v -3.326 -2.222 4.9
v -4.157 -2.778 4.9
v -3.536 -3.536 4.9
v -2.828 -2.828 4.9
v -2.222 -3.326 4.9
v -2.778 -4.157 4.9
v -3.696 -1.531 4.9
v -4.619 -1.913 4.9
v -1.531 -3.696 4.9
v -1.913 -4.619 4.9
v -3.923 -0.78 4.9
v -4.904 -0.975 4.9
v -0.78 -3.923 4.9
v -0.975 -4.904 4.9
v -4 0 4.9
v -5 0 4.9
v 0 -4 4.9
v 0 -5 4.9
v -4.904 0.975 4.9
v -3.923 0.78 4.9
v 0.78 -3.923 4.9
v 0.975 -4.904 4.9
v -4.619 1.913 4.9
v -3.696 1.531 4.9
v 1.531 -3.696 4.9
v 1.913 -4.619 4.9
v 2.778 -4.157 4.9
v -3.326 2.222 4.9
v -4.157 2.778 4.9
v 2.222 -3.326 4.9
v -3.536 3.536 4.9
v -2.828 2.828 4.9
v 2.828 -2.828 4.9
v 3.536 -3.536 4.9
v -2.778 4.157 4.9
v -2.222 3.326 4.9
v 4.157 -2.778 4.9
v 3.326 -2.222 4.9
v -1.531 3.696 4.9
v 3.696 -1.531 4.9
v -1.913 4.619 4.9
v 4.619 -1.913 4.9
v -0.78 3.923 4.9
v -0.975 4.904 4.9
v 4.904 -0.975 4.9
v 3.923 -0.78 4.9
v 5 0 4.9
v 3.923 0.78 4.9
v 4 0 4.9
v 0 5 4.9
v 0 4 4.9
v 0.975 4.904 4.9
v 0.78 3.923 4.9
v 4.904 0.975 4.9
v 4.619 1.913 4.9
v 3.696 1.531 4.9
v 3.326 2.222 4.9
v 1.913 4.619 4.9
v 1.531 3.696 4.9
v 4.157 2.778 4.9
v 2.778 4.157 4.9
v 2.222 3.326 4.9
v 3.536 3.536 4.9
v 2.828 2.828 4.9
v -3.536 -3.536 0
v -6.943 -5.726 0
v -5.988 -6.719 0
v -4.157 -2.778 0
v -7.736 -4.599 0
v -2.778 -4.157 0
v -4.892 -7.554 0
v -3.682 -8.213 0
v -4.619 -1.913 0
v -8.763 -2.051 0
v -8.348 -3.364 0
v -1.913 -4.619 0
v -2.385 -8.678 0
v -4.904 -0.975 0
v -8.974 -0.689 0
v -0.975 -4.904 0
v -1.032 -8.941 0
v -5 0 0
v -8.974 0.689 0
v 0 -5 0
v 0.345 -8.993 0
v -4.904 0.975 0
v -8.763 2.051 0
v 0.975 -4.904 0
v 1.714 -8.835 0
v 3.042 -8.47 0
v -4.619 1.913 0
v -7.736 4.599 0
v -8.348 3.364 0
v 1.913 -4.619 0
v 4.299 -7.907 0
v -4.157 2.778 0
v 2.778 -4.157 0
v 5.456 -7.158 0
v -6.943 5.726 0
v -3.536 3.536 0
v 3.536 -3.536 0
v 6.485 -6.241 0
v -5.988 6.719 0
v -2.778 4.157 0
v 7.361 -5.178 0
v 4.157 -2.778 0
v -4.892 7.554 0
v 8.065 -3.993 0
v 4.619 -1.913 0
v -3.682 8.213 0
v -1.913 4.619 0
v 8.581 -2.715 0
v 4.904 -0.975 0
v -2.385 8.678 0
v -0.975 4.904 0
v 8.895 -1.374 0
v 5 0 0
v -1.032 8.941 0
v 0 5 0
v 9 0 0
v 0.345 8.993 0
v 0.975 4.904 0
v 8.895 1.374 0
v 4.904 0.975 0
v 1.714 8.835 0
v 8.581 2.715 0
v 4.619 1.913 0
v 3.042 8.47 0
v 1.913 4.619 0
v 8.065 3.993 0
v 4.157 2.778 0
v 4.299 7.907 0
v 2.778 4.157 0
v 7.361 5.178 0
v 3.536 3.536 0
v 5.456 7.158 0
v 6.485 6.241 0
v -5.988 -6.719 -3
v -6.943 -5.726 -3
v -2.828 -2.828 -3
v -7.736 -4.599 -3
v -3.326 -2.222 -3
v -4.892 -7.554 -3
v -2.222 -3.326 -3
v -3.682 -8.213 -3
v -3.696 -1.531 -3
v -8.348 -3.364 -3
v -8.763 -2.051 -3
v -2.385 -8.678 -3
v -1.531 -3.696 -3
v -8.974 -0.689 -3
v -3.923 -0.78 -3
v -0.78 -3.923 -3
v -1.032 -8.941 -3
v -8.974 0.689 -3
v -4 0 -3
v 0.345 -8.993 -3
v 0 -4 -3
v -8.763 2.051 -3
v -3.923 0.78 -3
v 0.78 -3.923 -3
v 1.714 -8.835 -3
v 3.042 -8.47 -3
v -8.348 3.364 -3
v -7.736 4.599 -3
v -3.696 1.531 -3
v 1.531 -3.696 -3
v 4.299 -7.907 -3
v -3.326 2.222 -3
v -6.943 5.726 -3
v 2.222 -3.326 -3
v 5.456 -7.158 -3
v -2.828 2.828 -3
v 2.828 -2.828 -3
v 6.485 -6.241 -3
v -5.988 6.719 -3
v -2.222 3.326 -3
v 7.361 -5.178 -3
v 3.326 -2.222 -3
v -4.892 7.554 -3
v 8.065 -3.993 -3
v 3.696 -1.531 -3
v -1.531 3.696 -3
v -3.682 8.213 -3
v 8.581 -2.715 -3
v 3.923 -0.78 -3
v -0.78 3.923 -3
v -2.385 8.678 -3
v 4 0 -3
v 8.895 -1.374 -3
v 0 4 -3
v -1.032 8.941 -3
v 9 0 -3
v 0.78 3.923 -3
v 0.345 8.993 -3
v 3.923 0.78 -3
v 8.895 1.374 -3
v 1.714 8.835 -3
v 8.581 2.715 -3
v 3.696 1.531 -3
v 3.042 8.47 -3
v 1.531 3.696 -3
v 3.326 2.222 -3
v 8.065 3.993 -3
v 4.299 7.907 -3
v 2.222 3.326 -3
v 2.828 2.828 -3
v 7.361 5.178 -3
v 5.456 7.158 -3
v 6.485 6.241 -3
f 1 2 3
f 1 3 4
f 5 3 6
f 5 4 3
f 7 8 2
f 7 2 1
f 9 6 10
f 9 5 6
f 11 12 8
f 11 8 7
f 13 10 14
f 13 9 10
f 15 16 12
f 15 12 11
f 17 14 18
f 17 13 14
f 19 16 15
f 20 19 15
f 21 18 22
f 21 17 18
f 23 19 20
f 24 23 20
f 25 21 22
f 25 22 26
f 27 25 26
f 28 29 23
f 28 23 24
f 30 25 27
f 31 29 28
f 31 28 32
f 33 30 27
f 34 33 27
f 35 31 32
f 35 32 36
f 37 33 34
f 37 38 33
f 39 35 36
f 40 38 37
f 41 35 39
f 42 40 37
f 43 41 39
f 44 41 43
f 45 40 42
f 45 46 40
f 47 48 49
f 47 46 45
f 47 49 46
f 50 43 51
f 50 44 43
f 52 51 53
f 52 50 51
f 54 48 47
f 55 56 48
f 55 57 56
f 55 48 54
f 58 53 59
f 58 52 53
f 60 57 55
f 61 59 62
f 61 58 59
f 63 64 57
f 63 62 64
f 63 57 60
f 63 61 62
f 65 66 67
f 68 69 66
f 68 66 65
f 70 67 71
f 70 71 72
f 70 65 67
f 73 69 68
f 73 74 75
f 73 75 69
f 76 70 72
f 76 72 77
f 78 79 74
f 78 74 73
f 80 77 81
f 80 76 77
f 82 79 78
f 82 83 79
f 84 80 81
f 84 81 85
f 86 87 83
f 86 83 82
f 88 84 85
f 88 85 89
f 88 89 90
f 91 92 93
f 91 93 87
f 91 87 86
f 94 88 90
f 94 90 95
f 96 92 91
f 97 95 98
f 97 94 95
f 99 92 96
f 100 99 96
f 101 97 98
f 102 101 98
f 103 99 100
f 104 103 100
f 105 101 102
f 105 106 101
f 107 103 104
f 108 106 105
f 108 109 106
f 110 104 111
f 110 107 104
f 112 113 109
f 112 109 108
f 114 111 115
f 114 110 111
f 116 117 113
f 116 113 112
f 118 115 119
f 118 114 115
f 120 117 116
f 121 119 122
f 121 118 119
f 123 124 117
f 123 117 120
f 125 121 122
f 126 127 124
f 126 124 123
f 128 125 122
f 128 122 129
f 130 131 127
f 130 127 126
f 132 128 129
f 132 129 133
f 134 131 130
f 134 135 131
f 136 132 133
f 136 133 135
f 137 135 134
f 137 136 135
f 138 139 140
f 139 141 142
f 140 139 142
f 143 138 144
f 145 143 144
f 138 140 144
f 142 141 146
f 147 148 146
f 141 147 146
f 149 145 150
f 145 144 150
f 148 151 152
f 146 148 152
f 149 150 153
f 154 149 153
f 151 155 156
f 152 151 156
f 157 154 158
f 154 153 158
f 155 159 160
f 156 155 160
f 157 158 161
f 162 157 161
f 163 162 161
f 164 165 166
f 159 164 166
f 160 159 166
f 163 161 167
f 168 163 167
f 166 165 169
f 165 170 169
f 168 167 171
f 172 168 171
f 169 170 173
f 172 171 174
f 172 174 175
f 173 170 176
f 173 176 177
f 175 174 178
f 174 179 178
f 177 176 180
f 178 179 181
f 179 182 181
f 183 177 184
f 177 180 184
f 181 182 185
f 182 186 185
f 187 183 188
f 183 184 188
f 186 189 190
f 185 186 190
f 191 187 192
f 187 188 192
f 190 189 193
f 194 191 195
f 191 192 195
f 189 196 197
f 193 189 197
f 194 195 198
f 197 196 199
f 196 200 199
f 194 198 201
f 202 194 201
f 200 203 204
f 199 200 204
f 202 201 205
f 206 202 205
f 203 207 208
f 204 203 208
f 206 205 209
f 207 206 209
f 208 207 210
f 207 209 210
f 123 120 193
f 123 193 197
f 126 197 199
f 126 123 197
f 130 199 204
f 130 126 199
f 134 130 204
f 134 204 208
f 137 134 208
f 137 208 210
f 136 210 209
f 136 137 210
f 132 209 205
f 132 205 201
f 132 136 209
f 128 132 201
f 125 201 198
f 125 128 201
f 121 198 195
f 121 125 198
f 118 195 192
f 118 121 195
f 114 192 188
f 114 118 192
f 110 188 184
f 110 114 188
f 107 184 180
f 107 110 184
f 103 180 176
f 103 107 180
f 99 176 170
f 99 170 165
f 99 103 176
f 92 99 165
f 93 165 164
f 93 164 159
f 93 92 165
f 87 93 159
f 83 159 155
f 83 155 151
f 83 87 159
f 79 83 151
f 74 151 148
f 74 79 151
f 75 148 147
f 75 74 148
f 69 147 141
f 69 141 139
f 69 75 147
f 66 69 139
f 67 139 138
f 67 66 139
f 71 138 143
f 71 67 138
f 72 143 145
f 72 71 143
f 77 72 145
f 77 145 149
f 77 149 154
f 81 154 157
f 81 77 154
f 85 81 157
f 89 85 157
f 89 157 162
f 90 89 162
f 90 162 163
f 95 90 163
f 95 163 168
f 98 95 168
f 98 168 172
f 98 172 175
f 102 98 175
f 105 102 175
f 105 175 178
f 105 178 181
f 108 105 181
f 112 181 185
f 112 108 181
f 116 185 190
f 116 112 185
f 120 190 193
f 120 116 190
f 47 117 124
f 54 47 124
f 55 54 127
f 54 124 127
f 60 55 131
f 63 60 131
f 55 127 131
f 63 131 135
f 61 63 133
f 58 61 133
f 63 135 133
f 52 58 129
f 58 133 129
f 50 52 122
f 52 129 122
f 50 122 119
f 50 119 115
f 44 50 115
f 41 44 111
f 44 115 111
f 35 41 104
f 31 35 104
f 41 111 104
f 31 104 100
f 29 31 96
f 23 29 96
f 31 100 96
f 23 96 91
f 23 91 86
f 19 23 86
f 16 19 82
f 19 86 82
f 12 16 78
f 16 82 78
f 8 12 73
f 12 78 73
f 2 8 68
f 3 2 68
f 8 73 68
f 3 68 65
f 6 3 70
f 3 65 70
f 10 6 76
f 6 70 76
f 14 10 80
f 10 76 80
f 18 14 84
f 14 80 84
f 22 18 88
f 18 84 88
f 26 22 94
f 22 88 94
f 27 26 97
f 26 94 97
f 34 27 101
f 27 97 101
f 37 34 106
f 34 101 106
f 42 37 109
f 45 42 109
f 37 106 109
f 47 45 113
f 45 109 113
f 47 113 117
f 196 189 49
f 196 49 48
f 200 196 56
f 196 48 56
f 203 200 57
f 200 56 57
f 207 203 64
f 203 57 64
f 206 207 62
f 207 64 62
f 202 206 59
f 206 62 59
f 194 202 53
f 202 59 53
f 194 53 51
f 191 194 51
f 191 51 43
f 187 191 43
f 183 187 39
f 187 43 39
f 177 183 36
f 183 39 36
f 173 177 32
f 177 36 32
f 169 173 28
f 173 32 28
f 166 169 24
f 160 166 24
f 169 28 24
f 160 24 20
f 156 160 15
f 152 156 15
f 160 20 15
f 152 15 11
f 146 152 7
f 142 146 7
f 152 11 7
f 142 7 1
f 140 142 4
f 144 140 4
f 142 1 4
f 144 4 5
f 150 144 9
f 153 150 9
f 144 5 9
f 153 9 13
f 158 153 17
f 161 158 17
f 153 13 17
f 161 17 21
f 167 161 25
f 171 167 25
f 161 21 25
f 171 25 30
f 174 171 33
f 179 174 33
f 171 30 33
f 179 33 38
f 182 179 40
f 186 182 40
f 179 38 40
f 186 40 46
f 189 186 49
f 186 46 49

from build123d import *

# Parameters (mm, degrees)
F0_R     = 9
F1_DEPTH = 3
F2_R     = 5
F3_DEPTH = 4.9
F4_R     = 4
F5_DEPTH = 15


with BuildPart() as f1:
    # F0 (on Top) → F1 (new body)
    with BuildSketch(Plane.XY):
        Circle(F0_R)
    extrude(amount=-F1_DEPTH)

    # F2 (on Top) → F3 (join)
    with BuildSketch(Plane.XY):
        Circle(F2_R)
    extrude(amount=F3_DEPTH)

    # F4 (on Top) → F5 (cut, symmetric)
    with BuildSketch(Plane.XY):
        Circle(F4_R)
    extrude(amount=F5_DEPTH, both=True, mode=Mode.SUBTRACT)


solid = f1.part
